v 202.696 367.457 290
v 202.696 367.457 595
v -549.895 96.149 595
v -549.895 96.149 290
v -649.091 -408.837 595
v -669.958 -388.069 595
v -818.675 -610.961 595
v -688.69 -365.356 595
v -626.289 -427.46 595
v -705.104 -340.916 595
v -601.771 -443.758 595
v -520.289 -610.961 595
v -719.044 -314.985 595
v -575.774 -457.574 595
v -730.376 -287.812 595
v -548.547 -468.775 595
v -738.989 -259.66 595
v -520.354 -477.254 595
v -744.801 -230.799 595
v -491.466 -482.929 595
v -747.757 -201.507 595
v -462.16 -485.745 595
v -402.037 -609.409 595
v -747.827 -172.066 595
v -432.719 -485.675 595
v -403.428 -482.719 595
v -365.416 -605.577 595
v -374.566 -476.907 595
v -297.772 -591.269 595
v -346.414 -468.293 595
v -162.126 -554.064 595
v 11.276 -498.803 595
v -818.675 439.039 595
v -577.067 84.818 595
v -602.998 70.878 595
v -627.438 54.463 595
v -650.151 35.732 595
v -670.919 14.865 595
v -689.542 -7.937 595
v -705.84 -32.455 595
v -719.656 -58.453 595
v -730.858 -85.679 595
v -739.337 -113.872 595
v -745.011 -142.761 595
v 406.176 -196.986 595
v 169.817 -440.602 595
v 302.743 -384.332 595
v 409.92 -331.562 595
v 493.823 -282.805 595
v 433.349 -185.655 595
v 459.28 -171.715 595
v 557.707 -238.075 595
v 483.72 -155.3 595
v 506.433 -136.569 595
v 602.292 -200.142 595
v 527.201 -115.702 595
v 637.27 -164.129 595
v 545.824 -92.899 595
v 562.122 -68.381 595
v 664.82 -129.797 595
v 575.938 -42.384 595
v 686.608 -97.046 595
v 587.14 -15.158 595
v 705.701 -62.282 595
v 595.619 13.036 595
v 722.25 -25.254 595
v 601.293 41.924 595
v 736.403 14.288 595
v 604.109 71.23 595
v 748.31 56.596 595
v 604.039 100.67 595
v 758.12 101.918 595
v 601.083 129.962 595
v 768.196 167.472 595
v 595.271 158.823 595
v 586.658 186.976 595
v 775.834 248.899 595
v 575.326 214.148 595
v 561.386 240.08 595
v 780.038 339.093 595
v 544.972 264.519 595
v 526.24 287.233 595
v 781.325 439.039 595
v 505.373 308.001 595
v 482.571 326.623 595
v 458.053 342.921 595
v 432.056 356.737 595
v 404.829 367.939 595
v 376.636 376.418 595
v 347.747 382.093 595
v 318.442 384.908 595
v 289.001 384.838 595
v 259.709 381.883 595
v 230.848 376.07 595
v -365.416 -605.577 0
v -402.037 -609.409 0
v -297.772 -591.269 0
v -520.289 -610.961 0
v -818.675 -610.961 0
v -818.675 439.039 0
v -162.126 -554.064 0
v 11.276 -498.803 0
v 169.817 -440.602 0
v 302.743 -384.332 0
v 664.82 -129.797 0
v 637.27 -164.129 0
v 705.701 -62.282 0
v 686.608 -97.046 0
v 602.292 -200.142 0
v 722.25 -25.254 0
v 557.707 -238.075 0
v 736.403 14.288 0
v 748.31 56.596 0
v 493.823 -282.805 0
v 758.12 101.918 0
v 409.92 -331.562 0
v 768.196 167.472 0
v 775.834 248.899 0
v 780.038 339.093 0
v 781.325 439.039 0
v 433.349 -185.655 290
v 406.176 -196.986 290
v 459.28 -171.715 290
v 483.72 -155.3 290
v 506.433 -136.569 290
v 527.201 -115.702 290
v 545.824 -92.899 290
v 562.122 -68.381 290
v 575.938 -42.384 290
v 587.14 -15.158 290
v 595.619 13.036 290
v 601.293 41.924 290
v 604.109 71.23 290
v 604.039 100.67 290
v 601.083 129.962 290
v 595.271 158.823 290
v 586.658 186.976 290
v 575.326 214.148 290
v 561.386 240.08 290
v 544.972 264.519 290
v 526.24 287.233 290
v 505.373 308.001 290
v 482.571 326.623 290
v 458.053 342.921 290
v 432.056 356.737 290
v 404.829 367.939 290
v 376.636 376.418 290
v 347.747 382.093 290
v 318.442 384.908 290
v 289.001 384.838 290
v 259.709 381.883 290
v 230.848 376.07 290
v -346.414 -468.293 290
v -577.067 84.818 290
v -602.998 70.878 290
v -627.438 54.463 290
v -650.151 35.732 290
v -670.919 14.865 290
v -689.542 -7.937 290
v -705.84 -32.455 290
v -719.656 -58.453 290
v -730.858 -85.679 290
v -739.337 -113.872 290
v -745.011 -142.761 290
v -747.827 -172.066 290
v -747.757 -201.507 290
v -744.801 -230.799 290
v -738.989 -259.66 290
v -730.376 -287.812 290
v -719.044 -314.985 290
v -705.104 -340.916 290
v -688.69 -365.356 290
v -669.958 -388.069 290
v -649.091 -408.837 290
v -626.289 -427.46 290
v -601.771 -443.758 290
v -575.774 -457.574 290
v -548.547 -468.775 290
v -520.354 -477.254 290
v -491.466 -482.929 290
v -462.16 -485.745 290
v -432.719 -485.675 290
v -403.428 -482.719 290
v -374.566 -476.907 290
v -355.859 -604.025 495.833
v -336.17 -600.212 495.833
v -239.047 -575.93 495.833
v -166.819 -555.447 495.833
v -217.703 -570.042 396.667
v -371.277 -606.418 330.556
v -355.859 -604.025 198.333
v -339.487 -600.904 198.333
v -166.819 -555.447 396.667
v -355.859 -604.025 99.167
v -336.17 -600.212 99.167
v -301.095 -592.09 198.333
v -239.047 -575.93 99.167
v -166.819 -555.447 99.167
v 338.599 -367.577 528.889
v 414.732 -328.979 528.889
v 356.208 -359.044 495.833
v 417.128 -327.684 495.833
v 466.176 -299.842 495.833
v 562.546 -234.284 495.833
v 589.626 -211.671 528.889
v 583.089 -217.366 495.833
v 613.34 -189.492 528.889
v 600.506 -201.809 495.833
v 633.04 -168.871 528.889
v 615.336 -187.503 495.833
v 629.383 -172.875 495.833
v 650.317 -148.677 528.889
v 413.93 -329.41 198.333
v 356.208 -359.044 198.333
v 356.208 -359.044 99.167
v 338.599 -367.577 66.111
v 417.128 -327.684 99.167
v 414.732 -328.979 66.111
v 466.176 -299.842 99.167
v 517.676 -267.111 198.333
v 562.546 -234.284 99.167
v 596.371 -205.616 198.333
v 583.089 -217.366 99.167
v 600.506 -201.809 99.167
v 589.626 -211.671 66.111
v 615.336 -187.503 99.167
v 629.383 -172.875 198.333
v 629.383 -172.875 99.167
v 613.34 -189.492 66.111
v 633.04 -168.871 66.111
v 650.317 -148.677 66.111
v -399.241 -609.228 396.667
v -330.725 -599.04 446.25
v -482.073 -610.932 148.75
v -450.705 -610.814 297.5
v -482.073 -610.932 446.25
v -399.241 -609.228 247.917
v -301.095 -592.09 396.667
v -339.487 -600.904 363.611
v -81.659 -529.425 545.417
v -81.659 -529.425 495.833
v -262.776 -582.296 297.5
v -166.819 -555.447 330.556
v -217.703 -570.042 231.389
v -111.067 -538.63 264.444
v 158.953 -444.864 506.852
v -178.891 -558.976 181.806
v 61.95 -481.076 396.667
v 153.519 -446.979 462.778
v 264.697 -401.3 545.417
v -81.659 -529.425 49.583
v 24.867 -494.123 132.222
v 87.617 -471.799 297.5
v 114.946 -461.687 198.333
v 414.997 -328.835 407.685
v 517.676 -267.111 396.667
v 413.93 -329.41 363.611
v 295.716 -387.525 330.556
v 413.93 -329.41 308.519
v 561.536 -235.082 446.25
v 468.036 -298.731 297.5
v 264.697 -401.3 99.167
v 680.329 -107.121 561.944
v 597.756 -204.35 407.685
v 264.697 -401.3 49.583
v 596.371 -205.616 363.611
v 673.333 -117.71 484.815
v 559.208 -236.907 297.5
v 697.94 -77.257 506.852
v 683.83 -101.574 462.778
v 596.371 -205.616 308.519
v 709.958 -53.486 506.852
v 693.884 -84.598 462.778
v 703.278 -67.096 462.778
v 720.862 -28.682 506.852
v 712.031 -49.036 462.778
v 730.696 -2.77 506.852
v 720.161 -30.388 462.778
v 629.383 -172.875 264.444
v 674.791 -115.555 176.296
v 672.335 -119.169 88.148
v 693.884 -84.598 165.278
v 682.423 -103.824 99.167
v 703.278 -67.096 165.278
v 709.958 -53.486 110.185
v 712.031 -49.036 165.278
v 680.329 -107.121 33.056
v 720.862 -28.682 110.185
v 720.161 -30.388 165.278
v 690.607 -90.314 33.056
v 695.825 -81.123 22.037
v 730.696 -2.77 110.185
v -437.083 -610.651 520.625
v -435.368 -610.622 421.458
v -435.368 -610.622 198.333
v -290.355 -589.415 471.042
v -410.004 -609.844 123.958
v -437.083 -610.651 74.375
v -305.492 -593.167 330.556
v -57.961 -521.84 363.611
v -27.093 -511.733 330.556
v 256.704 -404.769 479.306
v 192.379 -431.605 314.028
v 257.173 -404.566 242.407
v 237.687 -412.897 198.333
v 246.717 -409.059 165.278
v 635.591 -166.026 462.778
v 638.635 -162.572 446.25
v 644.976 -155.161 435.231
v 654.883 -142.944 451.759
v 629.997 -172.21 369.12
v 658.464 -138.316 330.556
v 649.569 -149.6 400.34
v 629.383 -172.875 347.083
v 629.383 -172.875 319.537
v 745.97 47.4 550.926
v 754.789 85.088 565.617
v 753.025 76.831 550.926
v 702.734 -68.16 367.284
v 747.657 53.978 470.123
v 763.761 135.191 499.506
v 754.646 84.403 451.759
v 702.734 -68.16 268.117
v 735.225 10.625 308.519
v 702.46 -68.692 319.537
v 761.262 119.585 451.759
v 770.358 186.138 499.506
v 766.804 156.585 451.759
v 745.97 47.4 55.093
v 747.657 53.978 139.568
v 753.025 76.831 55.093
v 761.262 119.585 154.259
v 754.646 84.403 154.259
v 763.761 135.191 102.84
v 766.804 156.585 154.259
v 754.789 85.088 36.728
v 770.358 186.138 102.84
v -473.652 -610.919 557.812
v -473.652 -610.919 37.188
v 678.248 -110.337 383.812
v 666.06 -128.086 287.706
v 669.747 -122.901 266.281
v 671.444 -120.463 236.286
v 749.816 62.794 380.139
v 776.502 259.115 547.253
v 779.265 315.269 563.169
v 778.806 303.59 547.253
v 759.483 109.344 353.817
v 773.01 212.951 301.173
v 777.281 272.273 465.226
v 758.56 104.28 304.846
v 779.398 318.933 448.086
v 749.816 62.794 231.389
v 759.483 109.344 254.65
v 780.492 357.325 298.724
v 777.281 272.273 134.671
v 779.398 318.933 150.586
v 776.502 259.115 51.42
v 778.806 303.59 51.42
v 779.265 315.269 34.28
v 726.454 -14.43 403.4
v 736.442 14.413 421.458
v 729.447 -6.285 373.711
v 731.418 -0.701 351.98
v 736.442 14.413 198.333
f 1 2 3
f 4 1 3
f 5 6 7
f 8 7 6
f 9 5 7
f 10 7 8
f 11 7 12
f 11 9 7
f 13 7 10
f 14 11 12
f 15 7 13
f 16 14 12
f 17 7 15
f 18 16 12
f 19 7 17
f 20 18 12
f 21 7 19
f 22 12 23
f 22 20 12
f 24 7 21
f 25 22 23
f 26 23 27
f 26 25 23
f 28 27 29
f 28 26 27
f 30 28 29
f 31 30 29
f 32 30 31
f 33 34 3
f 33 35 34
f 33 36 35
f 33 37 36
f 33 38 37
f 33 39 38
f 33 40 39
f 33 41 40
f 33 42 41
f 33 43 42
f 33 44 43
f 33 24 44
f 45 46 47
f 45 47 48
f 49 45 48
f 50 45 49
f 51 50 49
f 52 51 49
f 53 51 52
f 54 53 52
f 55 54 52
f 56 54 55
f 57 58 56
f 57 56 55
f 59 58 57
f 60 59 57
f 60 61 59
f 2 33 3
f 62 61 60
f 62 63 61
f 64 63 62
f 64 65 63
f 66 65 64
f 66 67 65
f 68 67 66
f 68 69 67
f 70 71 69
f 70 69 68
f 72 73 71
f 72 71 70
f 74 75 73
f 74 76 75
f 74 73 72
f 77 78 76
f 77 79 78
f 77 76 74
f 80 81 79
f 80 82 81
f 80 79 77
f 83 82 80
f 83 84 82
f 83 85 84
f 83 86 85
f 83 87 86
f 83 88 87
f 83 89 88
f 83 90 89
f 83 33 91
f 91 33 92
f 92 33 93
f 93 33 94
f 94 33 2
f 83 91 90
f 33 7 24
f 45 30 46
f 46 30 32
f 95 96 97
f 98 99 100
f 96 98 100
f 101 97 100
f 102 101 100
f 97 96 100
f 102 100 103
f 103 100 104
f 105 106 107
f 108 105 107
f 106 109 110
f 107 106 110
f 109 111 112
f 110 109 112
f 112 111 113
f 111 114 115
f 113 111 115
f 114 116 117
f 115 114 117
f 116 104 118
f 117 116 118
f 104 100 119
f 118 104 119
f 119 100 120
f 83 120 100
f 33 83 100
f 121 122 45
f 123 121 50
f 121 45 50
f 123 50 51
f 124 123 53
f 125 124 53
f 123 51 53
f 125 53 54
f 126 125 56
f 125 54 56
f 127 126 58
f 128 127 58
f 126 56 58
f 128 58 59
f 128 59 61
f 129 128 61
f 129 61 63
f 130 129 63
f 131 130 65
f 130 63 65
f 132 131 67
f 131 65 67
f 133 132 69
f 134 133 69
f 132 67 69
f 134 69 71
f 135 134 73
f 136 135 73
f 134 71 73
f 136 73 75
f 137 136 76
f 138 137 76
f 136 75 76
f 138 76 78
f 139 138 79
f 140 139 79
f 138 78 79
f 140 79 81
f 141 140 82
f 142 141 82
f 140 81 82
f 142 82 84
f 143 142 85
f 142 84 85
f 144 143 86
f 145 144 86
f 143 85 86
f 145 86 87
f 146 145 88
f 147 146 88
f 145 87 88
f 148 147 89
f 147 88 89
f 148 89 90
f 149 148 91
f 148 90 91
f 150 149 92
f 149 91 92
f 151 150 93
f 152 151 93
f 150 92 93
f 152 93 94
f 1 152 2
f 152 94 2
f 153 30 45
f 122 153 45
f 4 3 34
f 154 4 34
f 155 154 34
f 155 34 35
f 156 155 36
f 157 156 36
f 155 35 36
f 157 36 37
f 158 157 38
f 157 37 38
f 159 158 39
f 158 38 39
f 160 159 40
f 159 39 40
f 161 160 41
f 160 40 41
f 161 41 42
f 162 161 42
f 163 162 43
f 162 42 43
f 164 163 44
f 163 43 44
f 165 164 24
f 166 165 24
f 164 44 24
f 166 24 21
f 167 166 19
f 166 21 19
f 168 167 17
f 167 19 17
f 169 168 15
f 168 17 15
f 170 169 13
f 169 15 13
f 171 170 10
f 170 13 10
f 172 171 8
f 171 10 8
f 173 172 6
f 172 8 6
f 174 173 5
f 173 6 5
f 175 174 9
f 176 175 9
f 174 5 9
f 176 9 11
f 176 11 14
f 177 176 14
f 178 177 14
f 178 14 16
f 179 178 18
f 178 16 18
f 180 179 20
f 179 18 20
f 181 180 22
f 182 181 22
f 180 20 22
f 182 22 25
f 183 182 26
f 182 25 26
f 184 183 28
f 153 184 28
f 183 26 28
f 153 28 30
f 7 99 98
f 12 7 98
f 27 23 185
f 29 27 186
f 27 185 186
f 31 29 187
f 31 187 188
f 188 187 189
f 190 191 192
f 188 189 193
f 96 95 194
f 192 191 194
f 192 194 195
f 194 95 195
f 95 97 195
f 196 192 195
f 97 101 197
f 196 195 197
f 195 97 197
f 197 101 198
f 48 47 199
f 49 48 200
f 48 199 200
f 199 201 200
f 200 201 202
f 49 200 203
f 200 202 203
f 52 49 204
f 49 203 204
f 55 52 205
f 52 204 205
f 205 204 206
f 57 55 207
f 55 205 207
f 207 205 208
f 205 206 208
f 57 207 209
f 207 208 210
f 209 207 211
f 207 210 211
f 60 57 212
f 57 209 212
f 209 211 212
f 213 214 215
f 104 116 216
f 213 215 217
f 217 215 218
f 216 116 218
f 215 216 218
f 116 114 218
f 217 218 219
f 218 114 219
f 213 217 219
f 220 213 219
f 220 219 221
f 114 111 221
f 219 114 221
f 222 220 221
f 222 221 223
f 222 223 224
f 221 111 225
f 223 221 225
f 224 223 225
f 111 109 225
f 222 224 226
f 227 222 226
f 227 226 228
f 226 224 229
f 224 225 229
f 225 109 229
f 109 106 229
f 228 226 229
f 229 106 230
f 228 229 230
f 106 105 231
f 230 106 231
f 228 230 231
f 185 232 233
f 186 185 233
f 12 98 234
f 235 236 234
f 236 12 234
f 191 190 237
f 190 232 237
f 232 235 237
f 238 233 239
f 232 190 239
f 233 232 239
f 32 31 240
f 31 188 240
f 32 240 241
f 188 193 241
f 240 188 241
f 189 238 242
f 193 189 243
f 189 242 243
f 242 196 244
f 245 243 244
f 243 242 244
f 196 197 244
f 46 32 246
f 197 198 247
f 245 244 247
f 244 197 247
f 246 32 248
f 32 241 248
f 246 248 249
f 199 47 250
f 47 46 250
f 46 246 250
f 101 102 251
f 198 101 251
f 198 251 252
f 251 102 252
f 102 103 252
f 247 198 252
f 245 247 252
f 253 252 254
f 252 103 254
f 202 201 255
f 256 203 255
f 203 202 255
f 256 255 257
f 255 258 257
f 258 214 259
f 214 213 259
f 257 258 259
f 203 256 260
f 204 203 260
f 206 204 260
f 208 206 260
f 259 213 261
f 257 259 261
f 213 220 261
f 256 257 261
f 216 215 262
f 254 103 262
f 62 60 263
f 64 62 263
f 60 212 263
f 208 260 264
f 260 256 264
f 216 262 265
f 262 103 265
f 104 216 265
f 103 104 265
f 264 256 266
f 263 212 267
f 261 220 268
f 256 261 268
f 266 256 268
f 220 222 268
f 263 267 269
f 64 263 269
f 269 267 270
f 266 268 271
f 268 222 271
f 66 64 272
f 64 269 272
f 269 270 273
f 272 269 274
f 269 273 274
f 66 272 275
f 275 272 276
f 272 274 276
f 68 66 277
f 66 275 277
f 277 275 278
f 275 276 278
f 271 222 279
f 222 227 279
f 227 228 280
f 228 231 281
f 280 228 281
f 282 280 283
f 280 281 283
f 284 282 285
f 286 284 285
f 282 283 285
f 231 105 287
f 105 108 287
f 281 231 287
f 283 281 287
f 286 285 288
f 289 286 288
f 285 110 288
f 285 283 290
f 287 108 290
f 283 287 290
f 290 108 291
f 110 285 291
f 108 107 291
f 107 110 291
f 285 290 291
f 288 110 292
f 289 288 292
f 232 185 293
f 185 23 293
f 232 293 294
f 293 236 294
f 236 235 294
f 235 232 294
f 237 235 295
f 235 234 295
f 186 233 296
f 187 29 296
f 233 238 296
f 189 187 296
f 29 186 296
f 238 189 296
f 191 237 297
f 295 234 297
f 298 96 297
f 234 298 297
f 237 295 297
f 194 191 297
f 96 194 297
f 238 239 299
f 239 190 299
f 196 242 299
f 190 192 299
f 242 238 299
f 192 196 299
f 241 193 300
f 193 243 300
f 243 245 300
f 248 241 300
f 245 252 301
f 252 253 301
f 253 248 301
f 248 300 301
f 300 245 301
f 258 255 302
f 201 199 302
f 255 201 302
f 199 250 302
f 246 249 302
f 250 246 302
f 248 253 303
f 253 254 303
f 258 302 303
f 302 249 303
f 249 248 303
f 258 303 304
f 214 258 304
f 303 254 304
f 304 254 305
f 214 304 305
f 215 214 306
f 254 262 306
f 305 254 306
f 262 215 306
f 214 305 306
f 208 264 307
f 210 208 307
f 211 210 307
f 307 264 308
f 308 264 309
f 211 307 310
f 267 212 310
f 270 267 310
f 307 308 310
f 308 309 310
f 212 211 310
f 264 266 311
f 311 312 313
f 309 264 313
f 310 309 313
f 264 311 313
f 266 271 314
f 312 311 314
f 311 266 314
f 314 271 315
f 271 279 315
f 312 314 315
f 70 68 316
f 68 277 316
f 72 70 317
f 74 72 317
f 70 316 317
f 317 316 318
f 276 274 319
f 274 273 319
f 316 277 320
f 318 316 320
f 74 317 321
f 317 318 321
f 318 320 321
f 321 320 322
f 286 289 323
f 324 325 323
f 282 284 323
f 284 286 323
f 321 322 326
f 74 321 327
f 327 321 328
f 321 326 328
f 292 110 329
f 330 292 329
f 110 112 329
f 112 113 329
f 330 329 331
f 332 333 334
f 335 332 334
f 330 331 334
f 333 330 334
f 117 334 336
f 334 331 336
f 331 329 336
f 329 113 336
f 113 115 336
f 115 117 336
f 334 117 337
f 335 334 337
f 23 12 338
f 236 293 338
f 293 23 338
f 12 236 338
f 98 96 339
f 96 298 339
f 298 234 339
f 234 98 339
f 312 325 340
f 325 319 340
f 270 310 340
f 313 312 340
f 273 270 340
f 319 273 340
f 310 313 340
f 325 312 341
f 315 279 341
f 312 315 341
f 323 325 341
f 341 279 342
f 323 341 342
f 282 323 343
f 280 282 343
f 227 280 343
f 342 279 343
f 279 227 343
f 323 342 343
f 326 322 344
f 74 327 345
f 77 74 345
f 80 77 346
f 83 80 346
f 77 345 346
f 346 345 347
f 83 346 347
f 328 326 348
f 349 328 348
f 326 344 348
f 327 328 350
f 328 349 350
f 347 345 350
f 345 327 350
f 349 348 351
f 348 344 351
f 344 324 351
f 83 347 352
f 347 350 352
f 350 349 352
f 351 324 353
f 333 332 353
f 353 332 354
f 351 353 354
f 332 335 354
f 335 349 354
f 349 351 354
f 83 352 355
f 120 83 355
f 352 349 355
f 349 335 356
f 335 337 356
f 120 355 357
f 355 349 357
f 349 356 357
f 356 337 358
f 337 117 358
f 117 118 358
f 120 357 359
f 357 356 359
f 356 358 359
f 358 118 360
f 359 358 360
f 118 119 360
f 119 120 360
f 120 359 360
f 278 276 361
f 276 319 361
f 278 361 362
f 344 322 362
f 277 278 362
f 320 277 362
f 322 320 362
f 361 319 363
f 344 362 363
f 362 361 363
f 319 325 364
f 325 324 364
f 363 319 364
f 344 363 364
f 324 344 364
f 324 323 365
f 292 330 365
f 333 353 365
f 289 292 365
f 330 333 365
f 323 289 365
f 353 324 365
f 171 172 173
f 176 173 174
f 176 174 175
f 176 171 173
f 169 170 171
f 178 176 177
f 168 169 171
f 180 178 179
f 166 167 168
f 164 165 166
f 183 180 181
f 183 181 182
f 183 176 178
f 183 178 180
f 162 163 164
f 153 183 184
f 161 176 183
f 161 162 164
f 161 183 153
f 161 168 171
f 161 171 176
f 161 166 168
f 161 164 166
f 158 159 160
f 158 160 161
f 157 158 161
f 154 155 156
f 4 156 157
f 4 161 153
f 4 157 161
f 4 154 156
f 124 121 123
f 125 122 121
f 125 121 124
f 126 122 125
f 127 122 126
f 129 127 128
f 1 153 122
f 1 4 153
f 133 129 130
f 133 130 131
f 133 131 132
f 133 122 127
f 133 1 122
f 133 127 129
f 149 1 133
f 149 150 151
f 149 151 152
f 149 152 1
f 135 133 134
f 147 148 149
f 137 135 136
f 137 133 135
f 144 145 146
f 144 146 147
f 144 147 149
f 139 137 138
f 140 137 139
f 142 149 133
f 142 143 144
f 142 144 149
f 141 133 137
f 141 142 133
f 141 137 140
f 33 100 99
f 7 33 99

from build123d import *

# Parameters (mm, degrees)
F1_DEPTH = 595
F3_DEPTH = 305


with BuildPart() as f1:
    # F0 (on Top) → F1 (new body)
    with BuildSketch(Plane.XY):
        with BuildLine():
            Line((781.3250578209, 439.03850317), (-818.6749421791, 439.03850317))
            Line((-818.6749421791, 439.03850317), (-818.6749421791, -610.96149683))
            Line((-818.6749421791, -610.96149683), (-520.2885866165, -610.96149683))
            add(Edge.make_bspline(
                [(-520.2885866165, -610.96149683), (-400.3724163575, -610.7884643122), (-348.5546672211, -615.2711222787), (677.9508016516, -306.760032696), (781.3378163617, 49.7424311157), (781.3250578209, 439.03850317)],
                knots=[0, 0, 0, 0, 0.2061009724, 0.6185113004, 1, 1, 1, 1], degree=3))
        make_face()
    extrude(amount=F1_DEPTH)

    # F2 (on face) → F3 (cut)
    with BuildSketch(Plane.XY.offset(595)):
        with BuildLine():
            Line((202.6958372748, 367.4568472644), (-549.8945345089, 96.1493974984))
            ThreePointArc((-549.8945345089, 96.1493974984), (-730.3756302655, -287.8122855827), (-346.4139471844, -468.2933813393))
            Line((-346.4139471844, -468.2933813393), (406.1764245993, -196.9859315734))
            ThreePointArc((406.1764245993, -196.9859315734), (586.6575203559, 186.9757515078), (202.6958372748, 367.4568472644))
        make_face()
    extrude(amount=-F3_DEPTH, mode=Mode.SUBTRACT)


solid = f1.part
